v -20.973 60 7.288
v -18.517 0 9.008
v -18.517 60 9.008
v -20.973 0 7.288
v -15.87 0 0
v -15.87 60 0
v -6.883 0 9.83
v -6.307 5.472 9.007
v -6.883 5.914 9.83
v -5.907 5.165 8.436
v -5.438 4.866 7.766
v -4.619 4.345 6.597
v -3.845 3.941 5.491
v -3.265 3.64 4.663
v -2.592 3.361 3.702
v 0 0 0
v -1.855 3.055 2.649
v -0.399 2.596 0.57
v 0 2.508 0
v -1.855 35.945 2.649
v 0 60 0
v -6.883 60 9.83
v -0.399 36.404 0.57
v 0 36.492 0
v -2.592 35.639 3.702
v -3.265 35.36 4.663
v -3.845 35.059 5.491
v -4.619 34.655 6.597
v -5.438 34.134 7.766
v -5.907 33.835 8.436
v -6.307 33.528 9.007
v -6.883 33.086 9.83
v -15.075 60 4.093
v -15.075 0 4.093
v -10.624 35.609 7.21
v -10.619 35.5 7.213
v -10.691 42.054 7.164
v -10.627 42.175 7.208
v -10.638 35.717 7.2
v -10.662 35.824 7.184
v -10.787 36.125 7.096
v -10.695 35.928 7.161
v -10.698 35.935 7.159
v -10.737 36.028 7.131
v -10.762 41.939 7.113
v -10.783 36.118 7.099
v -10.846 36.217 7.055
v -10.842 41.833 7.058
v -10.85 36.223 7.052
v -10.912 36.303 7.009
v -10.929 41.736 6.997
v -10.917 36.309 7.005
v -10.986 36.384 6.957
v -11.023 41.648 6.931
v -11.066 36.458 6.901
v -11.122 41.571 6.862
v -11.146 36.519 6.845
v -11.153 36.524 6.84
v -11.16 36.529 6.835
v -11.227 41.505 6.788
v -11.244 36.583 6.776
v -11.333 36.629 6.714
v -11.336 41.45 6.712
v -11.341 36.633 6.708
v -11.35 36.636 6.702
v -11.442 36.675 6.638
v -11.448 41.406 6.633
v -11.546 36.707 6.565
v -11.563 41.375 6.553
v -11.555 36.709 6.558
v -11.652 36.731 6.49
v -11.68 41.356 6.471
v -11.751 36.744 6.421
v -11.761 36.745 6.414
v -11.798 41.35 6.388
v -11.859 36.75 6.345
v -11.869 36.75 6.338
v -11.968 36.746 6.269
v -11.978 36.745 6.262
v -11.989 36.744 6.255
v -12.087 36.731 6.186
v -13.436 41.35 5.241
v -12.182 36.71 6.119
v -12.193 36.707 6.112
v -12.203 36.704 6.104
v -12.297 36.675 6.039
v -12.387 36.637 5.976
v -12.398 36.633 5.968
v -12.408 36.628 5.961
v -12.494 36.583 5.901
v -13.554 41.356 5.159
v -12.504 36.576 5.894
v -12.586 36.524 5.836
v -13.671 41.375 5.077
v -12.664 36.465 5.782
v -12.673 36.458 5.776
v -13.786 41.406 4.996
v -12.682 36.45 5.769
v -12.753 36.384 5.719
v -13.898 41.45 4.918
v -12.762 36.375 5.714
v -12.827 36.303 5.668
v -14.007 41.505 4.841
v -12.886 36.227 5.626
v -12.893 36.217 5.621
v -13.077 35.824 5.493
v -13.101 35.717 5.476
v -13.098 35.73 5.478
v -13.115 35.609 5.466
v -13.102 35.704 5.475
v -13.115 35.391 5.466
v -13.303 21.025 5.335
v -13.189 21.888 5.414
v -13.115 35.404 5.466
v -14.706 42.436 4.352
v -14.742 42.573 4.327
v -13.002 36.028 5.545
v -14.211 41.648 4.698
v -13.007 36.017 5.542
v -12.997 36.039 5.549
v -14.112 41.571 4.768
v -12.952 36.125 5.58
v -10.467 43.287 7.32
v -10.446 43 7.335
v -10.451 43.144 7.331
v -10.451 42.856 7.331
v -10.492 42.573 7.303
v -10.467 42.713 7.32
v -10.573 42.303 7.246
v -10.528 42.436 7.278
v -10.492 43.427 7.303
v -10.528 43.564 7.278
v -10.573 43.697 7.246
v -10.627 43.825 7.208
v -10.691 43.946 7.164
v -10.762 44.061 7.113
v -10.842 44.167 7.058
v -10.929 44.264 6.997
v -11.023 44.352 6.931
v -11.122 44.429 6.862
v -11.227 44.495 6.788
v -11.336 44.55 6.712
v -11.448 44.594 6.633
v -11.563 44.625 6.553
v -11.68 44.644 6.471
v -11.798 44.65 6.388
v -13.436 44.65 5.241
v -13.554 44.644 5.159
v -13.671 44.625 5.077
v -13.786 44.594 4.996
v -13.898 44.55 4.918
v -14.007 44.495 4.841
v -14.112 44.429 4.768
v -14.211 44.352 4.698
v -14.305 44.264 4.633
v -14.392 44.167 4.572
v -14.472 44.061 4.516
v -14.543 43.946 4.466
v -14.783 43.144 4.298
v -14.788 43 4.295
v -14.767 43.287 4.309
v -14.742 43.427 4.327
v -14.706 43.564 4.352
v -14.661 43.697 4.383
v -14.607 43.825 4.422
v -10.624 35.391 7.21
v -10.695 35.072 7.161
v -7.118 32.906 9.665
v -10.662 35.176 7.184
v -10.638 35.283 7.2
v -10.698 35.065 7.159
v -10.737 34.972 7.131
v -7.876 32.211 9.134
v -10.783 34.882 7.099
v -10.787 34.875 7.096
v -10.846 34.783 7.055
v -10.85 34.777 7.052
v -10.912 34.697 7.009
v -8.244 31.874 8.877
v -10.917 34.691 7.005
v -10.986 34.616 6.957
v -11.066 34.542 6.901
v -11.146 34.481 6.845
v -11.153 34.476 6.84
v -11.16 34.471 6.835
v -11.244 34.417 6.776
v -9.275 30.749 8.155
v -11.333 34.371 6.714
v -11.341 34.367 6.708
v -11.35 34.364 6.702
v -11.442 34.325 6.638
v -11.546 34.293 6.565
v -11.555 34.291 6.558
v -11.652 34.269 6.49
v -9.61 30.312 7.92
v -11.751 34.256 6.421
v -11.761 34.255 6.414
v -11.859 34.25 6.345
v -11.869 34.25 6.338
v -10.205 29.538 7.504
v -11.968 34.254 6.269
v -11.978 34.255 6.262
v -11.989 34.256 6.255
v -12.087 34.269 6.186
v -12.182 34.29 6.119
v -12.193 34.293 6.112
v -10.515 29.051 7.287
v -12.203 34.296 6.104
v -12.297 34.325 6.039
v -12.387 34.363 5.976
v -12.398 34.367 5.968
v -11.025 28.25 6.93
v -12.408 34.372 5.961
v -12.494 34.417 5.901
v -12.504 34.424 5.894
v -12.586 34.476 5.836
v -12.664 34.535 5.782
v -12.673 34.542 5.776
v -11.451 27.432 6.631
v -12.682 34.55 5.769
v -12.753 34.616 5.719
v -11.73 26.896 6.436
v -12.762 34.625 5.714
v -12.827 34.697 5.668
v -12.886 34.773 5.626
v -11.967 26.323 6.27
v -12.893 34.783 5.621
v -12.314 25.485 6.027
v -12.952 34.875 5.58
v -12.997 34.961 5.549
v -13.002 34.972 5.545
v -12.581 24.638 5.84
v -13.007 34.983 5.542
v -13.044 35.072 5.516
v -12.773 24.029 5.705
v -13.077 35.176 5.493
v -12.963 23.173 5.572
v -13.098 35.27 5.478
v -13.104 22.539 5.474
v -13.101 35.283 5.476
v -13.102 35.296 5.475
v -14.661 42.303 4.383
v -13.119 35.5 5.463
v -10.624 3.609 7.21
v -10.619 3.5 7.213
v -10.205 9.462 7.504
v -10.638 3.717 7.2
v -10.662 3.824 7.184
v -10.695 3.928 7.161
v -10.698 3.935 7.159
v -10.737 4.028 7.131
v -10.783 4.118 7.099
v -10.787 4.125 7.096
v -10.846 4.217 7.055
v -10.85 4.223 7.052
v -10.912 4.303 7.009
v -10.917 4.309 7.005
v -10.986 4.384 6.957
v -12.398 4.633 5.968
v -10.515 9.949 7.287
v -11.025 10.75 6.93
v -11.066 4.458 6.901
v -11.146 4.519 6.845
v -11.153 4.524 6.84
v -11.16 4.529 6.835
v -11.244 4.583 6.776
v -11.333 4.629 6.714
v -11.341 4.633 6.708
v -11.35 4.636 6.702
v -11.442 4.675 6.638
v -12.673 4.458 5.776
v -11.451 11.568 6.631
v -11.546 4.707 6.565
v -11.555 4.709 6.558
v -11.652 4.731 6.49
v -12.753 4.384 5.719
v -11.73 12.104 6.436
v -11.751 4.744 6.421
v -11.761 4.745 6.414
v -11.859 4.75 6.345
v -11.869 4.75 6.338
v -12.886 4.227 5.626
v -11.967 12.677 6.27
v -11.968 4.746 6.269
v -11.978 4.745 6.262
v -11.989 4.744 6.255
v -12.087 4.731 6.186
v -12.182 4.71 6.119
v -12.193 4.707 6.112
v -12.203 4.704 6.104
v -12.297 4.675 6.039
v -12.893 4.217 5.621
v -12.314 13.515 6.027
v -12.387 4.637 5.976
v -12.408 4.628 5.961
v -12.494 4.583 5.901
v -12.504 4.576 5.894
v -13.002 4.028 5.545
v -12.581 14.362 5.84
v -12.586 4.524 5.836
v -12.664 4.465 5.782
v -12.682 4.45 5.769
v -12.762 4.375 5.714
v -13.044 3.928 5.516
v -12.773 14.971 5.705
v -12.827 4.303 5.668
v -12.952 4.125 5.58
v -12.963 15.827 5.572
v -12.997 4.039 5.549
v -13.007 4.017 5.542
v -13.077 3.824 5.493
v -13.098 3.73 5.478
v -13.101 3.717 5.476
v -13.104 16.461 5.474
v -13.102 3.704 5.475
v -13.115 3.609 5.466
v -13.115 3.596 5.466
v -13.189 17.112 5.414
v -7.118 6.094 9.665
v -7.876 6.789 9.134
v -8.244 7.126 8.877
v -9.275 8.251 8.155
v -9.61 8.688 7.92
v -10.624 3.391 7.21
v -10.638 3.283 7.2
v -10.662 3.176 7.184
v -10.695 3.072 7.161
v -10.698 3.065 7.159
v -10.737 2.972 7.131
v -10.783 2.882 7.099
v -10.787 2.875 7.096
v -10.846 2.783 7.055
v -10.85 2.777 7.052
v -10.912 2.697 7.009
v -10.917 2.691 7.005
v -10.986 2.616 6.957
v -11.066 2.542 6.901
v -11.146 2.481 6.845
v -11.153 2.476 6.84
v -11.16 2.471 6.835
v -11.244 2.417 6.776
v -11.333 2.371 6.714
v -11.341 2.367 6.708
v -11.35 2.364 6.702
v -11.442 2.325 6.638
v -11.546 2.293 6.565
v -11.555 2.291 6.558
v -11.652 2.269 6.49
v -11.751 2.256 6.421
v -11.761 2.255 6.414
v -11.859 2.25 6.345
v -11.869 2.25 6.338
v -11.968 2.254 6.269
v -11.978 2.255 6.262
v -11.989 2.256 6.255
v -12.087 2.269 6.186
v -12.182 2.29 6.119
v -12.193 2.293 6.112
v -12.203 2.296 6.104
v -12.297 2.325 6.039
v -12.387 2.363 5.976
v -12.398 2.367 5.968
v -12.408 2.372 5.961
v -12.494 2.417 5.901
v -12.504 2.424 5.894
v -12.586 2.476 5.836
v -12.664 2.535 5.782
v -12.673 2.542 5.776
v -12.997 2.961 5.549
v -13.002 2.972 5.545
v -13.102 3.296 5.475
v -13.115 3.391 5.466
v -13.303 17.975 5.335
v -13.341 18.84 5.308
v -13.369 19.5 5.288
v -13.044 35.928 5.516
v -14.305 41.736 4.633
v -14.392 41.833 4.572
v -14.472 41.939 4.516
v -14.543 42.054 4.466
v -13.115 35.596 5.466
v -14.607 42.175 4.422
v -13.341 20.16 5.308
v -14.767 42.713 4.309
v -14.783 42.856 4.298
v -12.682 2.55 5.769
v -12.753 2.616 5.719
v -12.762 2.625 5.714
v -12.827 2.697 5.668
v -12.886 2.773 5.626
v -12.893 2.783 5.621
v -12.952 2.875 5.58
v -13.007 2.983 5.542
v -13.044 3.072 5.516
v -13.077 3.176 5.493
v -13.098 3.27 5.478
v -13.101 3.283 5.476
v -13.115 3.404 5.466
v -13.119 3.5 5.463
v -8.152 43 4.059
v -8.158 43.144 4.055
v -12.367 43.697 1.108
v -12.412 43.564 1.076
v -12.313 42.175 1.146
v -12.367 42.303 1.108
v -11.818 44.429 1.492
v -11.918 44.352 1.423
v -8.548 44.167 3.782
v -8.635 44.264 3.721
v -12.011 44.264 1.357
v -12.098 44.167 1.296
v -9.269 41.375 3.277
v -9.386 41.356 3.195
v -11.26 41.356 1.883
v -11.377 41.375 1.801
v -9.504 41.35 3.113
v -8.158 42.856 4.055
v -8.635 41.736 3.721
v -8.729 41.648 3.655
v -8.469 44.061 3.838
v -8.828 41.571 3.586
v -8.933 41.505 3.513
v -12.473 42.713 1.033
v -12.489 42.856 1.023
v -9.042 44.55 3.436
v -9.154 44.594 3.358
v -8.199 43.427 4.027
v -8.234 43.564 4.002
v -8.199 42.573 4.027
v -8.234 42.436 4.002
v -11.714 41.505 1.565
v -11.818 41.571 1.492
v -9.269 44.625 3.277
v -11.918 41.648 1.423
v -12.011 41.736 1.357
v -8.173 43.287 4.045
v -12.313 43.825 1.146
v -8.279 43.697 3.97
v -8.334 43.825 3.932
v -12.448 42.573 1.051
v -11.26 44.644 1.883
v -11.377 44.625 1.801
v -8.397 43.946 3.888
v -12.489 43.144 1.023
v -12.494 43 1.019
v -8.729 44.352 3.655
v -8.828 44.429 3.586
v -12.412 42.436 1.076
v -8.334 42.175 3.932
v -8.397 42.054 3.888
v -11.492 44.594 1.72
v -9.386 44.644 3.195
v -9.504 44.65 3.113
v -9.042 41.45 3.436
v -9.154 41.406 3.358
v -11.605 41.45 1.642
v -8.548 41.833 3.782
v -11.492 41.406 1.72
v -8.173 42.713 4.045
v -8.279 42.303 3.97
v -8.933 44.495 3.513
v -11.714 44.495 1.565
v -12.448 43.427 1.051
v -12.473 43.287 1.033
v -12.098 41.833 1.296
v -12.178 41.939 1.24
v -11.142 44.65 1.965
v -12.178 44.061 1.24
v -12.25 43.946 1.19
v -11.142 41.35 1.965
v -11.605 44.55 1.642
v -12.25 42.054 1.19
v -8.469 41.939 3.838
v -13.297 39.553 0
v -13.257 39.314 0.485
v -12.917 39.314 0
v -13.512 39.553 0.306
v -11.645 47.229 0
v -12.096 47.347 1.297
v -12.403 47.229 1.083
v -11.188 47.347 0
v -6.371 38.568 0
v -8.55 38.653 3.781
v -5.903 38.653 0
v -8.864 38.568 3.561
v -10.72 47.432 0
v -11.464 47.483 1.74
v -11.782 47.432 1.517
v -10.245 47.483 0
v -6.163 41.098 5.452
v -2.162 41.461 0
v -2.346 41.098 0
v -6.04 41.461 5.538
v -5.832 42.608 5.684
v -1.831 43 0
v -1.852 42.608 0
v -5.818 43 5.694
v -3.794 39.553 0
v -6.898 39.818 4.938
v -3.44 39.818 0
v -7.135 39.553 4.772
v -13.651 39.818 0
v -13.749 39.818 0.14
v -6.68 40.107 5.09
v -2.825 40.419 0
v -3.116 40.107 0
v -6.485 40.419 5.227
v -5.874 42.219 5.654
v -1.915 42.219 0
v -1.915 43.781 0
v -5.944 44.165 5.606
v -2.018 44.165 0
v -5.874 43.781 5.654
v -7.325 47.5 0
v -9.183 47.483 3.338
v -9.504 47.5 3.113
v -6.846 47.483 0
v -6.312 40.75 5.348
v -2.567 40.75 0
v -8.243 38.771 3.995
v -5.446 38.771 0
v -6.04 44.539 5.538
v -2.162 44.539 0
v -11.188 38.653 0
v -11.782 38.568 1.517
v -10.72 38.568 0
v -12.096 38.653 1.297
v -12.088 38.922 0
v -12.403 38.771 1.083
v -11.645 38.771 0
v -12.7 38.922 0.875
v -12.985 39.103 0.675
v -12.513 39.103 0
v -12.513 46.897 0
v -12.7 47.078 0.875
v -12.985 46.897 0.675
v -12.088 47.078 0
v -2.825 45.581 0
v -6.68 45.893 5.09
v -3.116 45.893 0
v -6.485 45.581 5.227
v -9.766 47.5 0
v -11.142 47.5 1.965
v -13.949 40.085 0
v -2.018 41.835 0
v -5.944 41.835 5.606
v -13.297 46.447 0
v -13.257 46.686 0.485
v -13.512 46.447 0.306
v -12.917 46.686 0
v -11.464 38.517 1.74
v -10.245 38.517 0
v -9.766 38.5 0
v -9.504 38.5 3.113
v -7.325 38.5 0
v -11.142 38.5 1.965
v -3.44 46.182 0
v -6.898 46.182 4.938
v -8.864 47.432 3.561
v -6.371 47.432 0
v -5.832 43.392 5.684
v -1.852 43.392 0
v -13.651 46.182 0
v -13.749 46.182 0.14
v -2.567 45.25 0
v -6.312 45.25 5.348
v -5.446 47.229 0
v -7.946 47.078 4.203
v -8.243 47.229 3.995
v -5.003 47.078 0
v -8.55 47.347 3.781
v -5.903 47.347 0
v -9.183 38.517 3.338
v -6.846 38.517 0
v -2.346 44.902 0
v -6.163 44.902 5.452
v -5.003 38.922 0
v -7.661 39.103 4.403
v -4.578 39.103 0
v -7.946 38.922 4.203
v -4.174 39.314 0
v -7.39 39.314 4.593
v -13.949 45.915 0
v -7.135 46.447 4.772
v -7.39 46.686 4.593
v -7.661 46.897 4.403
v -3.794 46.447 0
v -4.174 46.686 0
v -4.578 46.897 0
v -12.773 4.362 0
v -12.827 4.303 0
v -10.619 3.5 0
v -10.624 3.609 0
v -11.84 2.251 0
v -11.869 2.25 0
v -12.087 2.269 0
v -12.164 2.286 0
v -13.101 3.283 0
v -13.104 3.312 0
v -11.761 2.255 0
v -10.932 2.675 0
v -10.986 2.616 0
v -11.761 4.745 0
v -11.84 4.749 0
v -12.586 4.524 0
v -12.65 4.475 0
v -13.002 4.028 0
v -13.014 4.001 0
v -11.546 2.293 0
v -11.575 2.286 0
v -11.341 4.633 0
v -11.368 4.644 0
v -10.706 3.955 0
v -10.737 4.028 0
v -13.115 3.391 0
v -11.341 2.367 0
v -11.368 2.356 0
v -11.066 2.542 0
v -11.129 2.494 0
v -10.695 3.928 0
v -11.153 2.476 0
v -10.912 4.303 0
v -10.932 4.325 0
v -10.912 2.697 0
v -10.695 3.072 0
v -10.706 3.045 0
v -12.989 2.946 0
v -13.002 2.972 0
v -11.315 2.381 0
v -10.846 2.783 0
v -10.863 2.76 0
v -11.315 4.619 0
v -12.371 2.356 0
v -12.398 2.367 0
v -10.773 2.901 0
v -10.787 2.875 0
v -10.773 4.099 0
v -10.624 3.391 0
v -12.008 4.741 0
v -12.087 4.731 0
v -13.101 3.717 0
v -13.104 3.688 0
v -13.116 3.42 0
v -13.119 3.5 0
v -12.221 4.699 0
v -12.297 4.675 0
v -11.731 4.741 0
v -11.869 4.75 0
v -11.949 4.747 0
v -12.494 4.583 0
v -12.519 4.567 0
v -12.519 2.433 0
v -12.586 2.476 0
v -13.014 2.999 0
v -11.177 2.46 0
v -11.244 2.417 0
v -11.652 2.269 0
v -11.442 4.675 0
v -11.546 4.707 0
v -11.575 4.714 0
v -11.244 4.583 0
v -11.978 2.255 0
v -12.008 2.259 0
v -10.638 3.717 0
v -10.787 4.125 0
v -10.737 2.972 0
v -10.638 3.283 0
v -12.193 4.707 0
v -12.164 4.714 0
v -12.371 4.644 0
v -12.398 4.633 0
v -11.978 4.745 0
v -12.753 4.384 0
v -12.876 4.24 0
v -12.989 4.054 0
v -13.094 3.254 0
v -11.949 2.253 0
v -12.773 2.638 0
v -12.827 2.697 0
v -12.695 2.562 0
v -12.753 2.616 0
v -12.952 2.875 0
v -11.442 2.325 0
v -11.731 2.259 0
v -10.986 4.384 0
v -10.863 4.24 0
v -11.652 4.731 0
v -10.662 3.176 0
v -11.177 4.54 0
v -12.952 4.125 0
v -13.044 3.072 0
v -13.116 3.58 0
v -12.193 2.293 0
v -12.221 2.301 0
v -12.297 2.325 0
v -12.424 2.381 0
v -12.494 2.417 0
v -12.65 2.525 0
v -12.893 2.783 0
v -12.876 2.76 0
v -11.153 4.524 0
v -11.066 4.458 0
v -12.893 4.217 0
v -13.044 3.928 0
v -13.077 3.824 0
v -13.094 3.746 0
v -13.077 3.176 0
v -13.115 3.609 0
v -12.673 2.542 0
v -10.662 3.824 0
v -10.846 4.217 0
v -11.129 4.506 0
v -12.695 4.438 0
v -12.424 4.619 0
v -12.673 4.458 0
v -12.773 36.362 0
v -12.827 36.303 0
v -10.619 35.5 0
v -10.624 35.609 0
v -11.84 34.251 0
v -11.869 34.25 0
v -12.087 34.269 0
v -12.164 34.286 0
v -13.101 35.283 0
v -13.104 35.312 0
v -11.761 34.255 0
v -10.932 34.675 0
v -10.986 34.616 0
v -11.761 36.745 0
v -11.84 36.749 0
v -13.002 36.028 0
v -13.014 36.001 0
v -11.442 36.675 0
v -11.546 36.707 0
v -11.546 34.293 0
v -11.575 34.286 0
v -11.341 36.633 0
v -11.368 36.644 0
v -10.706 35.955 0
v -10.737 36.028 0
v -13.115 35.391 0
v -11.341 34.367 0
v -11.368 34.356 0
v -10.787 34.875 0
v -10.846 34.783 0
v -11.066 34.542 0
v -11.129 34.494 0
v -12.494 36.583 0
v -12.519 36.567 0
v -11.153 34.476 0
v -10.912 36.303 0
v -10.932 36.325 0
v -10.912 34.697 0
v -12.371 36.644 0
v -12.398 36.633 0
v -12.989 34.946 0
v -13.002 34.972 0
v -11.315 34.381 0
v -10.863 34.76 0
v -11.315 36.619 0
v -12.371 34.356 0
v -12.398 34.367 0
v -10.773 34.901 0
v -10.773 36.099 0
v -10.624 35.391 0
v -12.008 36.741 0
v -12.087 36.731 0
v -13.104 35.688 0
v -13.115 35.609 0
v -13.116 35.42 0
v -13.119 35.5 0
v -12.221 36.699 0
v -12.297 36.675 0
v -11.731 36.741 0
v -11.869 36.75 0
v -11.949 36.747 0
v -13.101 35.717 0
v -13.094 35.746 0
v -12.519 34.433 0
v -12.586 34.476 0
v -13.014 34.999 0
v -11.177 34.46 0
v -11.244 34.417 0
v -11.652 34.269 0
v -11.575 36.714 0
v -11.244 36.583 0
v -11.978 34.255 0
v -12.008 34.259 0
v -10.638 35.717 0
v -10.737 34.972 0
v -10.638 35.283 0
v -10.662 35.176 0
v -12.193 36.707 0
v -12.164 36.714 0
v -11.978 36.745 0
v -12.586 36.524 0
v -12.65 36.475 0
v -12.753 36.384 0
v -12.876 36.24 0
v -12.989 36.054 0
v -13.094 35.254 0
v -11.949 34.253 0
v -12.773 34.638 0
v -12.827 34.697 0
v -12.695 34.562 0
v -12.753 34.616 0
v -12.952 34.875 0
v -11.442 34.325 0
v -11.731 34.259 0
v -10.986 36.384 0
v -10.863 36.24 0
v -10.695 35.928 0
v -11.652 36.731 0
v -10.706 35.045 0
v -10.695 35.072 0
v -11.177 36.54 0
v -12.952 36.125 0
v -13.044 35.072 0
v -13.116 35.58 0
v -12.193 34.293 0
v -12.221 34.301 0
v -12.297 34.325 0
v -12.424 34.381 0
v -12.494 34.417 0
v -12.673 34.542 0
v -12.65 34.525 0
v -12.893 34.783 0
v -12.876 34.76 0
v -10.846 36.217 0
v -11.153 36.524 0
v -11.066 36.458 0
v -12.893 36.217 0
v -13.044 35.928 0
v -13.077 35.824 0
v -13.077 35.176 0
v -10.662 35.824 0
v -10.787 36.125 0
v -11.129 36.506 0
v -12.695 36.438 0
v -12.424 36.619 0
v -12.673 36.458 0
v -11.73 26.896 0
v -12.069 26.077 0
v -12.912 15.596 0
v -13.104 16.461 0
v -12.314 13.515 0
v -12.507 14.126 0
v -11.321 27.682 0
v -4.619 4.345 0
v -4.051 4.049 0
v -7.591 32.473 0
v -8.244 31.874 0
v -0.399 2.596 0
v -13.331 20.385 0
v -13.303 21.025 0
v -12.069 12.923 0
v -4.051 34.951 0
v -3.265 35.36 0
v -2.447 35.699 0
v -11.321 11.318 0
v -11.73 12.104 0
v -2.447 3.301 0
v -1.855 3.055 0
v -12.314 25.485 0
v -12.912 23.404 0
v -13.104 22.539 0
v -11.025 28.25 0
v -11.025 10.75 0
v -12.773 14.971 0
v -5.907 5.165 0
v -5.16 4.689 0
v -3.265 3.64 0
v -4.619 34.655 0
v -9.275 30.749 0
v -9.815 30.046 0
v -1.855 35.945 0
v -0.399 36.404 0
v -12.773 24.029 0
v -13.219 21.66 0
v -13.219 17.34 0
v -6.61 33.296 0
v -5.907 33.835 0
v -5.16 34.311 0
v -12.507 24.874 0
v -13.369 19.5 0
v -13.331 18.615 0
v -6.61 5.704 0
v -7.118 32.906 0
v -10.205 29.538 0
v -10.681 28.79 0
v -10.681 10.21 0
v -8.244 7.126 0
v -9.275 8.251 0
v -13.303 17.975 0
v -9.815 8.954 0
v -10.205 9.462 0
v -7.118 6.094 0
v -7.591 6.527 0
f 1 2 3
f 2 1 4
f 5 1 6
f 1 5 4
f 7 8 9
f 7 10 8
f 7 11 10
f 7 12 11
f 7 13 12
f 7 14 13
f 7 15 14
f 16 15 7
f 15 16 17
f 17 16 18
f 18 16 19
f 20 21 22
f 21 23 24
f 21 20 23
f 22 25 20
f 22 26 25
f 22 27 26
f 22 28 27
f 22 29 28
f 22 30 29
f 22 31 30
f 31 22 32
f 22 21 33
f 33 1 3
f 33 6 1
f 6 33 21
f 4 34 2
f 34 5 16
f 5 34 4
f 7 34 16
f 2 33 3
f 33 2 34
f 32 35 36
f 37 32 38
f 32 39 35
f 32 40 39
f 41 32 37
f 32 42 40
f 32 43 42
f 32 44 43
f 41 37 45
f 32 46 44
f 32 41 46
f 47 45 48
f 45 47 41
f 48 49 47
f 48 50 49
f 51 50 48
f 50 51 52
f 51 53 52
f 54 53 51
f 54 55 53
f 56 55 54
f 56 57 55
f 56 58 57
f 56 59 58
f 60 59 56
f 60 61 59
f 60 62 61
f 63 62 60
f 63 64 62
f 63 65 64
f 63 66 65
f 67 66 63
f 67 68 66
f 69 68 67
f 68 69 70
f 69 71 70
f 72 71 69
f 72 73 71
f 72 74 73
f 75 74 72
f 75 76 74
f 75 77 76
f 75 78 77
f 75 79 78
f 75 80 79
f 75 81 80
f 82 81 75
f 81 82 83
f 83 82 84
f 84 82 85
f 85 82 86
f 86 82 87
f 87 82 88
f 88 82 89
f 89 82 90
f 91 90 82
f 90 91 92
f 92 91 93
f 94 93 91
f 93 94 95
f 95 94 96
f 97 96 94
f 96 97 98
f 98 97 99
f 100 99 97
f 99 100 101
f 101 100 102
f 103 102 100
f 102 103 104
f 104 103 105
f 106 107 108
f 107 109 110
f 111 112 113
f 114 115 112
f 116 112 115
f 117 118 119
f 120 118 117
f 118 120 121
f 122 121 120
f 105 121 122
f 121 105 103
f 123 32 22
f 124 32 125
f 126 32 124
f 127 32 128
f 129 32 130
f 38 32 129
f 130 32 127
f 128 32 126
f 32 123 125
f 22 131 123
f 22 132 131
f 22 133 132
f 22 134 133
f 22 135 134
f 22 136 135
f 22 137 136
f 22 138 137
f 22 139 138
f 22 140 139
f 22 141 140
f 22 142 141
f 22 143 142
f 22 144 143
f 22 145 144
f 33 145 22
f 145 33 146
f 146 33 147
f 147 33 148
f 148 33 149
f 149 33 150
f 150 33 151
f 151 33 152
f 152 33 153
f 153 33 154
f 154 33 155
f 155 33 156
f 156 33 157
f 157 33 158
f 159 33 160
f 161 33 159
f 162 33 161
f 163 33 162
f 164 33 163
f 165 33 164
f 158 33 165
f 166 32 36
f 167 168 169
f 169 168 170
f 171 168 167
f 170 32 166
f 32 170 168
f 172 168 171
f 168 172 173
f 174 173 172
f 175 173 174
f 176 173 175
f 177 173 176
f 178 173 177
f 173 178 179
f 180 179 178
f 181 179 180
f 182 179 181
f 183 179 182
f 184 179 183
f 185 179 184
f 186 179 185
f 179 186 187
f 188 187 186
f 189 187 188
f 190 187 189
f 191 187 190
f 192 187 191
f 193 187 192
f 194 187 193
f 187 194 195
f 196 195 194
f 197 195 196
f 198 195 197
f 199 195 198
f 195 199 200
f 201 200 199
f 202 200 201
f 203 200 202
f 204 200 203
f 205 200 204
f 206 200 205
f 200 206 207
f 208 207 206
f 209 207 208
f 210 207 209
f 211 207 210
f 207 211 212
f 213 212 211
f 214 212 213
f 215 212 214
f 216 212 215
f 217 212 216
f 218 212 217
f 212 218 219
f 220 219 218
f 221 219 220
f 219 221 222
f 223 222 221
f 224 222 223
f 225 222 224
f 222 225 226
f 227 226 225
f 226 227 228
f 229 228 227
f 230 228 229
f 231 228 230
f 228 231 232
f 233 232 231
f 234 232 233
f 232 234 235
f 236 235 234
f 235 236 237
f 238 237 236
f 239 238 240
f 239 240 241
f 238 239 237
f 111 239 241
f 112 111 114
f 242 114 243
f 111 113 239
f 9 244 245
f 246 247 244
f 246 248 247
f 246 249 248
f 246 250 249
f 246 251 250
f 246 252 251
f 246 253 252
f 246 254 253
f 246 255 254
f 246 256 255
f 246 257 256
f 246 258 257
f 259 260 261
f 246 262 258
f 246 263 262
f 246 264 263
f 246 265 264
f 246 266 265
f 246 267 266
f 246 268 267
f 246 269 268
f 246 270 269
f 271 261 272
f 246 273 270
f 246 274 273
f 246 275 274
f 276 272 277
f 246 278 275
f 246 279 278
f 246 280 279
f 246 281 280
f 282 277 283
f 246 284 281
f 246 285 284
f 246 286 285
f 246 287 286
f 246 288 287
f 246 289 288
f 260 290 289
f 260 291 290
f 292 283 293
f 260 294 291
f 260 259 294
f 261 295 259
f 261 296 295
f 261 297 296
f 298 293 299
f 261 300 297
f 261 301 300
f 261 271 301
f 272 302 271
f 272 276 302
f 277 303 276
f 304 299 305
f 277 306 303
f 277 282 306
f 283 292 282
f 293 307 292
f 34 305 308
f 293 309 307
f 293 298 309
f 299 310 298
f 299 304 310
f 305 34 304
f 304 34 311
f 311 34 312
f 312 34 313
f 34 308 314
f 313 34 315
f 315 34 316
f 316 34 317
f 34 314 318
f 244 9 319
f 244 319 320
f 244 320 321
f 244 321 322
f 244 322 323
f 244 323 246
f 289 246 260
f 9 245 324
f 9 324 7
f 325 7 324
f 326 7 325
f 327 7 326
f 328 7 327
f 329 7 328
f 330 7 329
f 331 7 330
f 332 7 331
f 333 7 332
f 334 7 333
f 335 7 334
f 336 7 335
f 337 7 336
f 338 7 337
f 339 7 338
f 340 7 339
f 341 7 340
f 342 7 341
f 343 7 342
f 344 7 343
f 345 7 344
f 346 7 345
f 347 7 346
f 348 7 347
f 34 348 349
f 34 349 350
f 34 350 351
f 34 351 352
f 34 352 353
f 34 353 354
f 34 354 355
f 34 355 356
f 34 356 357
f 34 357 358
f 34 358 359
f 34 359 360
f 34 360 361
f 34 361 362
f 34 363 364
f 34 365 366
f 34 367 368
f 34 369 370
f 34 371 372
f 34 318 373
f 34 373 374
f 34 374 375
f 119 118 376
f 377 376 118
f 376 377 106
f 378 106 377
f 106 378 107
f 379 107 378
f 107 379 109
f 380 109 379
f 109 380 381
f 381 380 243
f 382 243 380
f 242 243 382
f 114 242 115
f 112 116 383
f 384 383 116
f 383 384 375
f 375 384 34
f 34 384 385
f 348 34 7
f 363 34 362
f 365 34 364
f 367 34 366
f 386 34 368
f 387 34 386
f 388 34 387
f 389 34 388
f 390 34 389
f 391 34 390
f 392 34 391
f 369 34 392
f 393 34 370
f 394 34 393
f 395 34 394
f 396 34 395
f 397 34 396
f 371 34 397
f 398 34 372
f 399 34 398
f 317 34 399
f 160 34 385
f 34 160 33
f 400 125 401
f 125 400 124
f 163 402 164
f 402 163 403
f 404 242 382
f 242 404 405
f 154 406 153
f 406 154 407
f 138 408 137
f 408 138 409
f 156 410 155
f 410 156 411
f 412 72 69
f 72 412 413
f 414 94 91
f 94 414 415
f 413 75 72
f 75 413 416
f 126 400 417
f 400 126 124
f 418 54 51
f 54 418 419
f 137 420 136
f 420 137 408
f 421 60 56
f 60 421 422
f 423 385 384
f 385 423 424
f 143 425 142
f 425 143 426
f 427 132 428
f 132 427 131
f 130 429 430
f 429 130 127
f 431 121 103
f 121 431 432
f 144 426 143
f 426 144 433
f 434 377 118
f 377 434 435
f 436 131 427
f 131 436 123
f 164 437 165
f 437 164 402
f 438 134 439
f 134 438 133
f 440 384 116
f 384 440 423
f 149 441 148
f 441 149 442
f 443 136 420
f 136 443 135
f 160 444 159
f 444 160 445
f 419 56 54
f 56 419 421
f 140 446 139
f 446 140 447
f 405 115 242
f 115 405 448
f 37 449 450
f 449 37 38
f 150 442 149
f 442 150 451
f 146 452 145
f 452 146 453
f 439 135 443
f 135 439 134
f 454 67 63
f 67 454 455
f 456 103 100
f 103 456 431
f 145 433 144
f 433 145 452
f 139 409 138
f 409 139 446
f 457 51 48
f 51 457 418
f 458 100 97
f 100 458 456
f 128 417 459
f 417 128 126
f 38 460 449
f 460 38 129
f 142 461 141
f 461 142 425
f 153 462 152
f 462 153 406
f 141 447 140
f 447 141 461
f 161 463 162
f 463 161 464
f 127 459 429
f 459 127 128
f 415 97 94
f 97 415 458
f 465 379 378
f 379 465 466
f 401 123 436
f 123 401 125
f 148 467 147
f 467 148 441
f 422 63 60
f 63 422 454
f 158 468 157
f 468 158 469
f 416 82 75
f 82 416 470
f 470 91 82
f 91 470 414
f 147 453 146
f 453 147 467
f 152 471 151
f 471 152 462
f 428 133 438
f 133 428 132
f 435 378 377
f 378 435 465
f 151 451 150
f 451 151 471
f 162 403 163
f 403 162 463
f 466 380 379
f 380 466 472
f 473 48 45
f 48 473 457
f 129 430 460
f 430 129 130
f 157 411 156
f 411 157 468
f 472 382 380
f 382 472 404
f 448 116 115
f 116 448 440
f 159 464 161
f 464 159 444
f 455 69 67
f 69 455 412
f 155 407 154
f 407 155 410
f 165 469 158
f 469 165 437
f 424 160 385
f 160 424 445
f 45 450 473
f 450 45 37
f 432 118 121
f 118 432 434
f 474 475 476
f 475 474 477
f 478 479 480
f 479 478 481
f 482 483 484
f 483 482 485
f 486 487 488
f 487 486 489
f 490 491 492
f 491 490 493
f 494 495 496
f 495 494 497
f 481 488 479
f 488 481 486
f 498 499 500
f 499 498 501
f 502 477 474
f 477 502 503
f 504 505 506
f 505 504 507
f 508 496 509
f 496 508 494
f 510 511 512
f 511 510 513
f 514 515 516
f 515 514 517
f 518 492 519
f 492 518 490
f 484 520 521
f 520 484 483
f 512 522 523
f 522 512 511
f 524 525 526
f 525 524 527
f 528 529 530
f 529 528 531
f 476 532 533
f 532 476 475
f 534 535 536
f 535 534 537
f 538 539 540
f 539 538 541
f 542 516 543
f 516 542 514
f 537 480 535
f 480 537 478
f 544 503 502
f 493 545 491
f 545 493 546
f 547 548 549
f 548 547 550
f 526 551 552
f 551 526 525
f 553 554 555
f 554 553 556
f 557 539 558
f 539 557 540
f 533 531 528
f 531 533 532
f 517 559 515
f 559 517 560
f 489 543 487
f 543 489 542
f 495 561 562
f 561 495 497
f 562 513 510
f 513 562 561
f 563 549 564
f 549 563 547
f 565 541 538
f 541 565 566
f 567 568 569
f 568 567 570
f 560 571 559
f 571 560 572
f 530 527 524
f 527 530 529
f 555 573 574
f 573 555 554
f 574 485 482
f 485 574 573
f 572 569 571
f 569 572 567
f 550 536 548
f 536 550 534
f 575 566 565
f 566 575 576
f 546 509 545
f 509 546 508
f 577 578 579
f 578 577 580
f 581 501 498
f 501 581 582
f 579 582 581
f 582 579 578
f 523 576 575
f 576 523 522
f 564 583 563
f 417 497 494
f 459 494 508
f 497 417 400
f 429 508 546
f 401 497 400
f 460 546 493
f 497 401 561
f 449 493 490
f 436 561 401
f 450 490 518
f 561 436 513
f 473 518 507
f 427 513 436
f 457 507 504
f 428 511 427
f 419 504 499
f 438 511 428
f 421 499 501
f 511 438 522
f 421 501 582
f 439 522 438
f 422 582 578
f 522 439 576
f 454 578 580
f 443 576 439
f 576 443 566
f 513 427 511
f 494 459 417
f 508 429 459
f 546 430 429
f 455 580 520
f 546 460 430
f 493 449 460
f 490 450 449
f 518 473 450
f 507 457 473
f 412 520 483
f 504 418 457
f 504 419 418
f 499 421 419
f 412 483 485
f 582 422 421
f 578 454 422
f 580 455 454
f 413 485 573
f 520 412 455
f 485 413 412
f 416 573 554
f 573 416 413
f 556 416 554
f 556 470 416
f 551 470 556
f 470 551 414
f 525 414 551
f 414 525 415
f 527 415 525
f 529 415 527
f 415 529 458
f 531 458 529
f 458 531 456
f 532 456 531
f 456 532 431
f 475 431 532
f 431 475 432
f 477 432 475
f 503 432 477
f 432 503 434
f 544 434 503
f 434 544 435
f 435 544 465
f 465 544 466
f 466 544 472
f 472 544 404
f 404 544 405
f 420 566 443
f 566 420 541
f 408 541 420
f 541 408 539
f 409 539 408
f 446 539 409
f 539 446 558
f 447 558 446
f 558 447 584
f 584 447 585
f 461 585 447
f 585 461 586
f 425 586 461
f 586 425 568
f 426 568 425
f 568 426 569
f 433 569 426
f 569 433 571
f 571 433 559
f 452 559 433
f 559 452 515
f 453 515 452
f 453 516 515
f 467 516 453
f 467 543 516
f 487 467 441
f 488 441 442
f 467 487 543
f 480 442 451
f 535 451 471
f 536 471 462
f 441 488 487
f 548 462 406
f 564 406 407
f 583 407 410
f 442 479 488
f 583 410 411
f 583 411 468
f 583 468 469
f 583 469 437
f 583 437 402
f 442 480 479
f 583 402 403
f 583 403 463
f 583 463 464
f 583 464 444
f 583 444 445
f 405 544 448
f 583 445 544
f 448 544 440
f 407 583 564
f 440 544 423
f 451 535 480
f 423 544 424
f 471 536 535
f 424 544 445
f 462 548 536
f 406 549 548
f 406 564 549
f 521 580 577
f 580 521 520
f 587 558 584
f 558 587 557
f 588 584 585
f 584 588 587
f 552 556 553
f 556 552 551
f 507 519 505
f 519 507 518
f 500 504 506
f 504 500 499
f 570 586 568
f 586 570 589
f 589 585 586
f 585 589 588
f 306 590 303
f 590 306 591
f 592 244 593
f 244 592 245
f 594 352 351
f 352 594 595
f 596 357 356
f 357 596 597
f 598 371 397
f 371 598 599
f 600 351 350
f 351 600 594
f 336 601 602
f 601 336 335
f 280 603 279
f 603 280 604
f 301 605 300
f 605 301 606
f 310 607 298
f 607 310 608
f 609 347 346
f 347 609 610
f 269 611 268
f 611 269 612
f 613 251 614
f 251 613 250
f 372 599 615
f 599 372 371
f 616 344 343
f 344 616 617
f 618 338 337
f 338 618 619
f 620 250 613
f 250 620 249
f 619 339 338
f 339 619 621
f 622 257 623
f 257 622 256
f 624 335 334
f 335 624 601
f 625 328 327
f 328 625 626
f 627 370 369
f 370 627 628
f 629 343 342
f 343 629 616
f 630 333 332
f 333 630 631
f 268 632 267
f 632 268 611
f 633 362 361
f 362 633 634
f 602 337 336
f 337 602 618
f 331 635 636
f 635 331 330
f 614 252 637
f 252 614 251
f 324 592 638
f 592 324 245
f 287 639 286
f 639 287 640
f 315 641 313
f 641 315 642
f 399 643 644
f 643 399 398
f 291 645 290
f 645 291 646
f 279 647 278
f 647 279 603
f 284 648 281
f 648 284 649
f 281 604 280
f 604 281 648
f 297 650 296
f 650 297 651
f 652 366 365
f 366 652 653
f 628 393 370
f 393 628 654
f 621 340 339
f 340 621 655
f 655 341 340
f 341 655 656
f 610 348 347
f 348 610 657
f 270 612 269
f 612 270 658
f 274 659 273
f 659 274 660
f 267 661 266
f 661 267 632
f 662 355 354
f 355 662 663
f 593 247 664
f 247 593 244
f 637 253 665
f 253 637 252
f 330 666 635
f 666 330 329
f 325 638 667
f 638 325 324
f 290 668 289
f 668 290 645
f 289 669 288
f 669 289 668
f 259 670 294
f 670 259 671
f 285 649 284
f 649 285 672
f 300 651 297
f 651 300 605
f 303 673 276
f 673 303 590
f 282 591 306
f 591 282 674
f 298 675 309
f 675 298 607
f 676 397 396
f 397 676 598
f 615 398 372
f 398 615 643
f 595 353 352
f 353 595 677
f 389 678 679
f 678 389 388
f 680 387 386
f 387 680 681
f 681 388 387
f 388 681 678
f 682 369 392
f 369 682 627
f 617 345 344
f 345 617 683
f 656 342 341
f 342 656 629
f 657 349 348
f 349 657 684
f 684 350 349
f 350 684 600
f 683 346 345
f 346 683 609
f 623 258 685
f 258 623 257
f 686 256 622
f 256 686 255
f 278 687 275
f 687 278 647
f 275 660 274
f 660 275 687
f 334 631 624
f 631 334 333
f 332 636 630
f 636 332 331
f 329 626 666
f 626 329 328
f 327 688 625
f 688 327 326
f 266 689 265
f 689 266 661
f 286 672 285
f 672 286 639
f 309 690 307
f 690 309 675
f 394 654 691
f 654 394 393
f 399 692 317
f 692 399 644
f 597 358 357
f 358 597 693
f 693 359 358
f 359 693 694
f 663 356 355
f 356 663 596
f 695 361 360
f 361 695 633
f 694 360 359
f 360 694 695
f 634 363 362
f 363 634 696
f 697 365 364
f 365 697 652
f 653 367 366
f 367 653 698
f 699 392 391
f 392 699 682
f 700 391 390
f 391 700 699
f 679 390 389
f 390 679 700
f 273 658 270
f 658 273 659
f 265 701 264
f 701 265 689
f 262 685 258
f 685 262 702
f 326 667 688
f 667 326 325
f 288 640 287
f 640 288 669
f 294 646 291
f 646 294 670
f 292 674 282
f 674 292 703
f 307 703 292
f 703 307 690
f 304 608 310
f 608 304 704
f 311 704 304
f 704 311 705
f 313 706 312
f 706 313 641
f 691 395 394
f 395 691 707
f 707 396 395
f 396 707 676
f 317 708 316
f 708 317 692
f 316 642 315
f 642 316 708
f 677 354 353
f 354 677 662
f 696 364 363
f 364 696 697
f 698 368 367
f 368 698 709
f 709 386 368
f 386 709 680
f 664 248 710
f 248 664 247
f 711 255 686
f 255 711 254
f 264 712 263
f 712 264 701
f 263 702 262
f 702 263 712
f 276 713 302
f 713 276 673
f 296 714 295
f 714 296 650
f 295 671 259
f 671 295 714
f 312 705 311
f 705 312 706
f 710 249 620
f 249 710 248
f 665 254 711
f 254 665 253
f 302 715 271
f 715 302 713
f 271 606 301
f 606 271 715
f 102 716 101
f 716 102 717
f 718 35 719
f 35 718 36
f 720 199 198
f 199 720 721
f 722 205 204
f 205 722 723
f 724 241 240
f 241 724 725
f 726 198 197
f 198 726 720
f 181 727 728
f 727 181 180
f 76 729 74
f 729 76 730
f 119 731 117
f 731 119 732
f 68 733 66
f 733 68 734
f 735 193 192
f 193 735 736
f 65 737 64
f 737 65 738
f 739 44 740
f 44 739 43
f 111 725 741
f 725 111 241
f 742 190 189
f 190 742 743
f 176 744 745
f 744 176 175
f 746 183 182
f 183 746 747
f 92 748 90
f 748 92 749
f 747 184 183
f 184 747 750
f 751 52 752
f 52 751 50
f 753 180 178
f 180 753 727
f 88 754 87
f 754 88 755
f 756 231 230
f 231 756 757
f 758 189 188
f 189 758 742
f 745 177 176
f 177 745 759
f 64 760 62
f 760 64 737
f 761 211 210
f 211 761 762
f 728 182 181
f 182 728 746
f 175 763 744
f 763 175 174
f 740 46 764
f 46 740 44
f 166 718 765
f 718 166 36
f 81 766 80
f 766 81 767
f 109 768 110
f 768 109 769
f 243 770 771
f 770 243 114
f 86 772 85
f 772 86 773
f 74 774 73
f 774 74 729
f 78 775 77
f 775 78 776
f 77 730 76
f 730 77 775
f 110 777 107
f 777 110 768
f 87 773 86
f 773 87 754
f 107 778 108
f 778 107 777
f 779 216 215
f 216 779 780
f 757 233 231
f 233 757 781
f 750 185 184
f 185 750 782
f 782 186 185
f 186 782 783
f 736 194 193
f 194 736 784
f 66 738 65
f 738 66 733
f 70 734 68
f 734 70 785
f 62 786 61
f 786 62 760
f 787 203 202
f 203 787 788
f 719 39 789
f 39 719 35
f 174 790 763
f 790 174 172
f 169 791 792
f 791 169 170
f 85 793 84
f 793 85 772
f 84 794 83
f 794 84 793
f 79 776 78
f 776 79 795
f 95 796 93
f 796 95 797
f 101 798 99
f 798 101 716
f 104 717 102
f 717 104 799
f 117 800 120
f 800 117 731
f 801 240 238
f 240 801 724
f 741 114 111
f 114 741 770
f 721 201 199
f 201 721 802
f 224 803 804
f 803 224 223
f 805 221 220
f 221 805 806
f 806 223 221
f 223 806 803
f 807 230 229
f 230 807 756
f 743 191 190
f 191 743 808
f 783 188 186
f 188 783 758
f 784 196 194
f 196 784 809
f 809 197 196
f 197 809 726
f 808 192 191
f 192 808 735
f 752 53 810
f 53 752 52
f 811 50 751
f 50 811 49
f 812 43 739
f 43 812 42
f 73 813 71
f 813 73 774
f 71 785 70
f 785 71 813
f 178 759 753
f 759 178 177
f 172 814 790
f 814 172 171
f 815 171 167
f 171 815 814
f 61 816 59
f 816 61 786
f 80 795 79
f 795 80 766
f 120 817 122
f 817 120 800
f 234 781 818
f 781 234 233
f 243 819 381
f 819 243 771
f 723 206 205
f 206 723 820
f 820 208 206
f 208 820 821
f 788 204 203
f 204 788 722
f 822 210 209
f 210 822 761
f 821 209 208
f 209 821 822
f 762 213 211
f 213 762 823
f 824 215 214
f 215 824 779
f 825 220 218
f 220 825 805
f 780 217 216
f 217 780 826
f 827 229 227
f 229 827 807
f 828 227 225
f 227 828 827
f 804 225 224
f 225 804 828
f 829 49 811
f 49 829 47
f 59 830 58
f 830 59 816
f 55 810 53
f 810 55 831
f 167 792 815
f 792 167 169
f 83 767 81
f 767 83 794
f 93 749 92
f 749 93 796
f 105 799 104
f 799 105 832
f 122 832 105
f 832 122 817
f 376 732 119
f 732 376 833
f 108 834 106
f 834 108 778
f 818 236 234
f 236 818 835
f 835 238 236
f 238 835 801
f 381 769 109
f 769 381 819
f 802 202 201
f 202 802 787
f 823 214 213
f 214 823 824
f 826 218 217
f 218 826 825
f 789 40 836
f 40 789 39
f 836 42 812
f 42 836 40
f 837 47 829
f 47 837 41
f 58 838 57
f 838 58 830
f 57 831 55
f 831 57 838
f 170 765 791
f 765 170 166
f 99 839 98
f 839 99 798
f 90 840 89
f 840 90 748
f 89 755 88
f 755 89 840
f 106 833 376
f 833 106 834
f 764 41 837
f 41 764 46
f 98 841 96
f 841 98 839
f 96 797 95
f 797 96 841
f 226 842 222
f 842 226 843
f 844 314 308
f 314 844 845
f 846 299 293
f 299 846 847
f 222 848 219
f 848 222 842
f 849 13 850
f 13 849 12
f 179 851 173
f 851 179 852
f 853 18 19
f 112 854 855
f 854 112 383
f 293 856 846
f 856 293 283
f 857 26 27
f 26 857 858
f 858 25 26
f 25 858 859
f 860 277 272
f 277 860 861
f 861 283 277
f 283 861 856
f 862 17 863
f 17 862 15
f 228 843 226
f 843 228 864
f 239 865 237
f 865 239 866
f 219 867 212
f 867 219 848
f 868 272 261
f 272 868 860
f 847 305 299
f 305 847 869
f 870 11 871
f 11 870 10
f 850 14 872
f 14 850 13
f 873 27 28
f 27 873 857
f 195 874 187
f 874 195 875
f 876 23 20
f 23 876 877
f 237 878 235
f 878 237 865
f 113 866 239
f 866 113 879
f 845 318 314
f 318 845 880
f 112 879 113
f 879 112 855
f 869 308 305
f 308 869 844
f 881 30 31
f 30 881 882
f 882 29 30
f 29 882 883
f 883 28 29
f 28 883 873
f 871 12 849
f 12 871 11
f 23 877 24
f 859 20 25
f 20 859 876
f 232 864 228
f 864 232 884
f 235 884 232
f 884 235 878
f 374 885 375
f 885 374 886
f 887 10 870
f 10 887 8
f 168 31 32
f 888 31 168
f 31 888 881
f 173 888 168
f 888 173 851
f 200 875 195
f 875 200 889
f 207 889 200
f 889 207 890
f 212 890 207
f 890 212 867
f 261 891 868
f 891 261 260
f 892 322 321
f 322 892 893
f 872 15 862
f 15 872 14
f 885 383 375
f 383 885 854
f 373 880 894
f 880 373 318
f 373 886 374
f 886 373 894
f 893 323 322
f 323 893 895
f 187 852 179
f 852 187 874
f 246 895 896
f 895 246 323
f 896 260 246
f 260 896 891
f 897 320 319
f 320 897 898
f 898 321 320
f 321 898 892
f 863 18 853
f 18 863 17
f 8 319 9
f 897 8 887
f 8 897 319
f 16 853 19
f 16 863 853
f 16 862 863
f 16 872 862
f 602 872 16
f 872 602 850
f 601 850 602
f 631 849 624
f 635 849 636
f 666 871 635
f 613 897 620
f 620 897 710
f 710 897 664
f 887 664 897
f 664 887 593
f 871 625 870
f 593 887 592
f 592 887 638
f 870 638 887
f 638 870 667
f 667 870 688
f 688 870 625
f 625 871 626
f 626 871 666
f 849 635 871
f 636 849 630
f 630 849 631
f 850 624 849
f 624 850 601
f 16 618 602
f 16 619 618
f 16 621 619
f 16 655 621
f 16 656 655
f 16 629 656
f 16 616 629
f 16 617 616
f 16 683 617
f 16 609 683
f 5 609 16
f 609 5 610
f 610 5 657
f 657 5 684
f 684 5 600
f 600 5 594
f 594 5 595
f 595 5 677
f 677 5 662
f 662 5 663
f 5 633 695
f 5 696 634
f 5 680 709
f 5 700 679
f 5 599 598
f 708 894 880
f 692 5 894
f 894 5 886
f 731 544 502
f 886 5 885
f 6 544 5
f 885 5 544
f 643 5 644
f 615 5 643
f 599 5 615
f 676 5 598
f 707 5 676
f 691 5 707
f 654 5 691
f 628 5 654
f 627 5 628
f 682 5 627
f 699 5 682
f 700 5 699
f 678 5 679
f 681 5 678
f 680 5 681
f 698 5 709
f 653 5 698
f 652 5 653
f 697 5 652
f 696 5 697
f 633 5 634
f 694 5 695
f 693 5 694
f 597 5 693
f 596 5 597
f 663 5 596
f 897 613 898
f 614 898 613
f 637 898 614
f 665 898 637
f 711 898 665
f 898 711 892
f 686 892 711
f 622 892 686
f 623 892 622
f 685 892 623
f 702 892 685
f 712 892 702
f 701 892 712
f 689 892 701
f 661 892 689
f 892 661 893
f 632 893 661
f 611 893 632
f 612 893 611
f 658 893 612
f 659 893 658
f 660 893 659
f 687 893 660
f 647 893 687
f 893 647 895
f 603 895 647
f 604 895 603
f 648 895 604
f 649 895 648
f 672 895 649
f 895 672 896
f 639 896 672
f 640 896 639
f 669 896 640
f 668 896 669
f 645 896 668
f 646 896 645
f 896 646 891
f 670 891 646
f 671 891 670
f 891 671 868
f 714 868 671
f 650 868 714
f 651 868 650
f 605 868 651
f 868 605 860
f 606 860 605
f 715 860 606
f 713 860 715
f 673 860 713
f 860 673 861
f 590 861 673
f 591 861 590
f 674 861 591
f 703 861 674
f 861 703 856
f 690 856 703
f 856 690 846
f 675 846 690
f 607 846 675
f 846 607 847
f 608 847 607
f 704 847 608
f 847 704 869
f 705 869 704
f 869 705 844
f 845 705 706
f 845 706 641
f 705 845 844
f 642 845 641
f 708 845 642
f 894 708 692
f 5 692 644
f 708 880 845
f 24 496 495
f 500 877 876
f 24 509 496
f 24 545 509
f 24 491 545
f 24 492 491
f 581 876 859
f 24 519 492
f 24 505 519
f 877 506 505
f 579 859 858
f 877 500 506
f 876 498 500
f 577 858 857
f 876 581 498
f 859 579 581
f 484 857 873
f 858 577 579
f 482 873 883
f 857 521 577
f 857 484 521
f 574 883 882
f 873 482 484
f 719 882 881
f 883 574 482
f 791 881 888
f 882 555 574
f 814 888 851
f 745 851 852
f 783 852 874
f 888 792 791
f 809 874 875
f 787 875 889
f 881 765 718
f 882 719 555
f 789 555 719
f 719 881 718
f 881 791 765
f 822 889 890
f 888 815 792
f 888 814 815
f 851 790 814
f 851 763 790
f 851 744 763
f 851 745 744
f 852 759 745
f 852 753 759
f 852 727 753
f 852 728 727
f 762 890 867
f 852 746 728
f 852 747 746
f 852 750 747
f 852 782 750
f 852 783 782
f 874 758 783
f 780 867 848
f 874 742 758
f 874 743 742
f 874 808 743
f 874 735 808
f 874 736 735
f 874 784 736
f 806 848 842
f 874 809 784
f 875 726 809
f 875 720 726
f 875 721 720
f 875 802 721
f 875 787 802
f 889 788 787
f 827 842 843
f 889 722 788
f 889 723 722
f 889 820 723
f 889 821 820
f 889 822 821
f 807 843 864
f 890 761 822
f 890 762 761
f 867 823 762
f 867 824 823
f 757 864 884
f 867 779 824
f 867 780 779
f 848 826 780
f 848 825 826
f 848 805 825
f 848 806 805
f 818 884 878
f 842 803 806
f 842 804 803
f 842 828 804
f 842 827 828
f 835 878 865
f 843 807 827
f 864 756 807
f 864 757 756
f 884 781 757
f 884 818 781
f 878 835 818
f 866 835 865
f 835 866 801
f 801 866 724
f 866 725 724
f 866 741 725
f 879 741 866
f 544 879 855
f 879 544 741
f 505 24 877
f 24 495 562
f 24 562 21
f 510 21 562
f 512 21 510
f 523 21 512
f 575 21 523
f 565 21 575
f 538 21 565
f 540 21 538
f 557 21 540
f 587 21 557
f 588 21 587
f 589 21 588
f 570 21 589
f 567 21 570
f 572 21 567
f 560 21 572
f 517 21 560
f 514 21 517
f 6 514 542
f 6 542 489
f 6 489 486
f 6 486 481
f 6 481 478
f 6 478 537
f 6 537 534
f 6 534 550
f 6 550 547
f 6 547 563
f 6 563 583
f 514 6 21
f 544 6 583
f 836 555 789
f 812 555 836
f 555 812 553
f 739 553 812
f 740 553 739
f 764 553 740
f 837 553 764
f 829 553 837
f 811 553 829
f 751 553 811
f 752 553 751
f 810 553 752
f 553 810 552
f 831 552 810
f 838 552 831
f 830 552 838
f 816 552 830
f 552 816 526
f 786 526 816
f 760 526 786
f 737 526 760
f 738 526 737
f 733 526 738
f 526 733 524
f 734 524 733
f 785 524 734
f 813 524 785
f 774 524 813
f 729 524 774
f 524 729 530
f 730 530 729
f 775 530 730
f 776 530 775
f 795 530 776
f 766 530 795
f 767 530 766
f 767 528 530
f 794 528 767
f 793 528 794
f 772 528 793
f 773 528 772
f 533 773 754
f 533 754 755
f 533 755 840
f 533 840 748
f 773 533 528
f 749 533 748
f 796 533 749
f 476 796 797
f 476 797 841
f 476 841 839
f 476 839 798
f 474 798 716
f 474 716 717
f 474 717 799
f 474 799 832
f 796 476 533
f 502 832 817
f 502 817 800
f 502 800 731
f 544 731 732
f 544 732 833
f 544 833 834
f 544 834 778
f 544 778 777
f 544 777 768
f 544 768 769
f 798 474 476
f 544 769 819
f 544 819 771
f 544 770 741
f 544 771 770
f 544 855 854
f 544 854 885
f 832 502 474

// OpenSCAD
// Workpiece cooling fan holder for Makerfarm Prusa i3v.
// 
// TODO: derive the side wall thickness from the fan angle.
// TODO: define the main body using profile polygon extrusion.

/* [Hidden] */

// Set to 0 for final STL compilation (slow). Set to 1 for quick
// debugging (lower quality)
debug = 0;

/* [Global] */

// Fan angle. 
base_slop_angle = 35;  // [15:45]

// Diameter of the base attachment screw hole (M3x20).
base_hole_diameter = 3.3;

// Threaded holes for the fan screws (M3x12).
fan_screw_hole_diameter = 2.5;

// Thickness of the side wall at the botton of the slope.
base_side_thickness = 12;

/* [Hidden] */

// Set the mode (must be set to 0 for real STL generation).
$fn = (debug != 0) ? 16 : 72;

// Define the main block, without the slot and the holes.
base_length = 60; 
base_top_thickness = 3; 
base_width = base_side_thickness + 6;
base_height = base_top_thickness + 10;


// Distnace from the top of the part to the center of the hole.
base_hole_vertical_offset = base_top_thickness + 3;
base_hole_horizontal_offset = 43;
// Make the hole a vertical slot to allow this amount of play in 
// each direction.
base_hole_vertical_play = 1;

// The thickness left for the thread after removing the screw head sink.
// 4mm allows to go from the stock M3x16 to M3x20.
base_sink_thickness = 4;
// Have sufficient clearance for the M3 head.
base_sink_diameter=9;

// Define the two fan screw holes. The holes are perpendicular
// to the surface of the slope.
fan_screw_hole_space = 32;
fan_screw_hole_slope_offset = 4;
fan_screw_hole_horizontal_offset = 3.5;

// Define the big cut for the air flow. This cut is 
// perpendicular to the slope surface.
fan_vent_diameter = 35;

// Small > 0 values that are used to maintain manifold.
eps=0.001;
eps2 = 2 * eps;

// The main block, with a cut to form a L shape profile.
module base_main() {
  difference() {
    cube([base_width, base_length, base_height]);
    translate([base_side_thickness, -eps, -base_top_thickness]) 
        cube([base_width+eps, base_length+eps2, base_height+eps]); 
  }
}

module horizontal_hole(y, z, depth, d) {
  translate([-eps, y, z]) rotate([0, 90, 0]) 
    cylinder(r=d/2, h=depth + eps2);
}

// The hole and sink for the base screw.
module base_hole() {
  y = base_hole_horizontal_offset;
  z = base_height - base_hole_vertical_offset;
  // Vertical slot for perfect fit.
  hull() {
    horizontal_hole(y, z+base_hole_vertical_play, base_width, base_hole_diameter);
    horizontal_hole(y, z-base_hole_vertical_play, base_width, base_hole_diameter);
  }
  hull() {
    horizontal_hole(y, z+base_hole_vertical_play, base_side_thickness - base_sink_thickness, base_sink_diameter);
    horizontal_hole(y, z-base_hole_vertical_play, base_side_thickness - base_sink_thickness, base_sink_diameter);
  }
}

// A general round hole that is perpendicular to the slop surface. Offset is from
// the top of the slop, d diameter.
module slope_hole(y, offset, d) {
  // Some math mumbo jumbo.
  t1 = offset * cos(base_slop_angle);
  t2 = base_height - t1;
  t3 = tan(base_slop_angle)*t2;
  t4 = t3 * tan(base_slop_angle);
  z = t2 + t4;
  translate([-eps, y, z]) rotate([0, 90+base_slop_angle, 0])  
      translate([0, 0, -base_width]) cylinder(r=d/2, h=2*base_width);
}

module fan_screw_holes() {
  slope_hole(fan_screw_hole_horizontal_offset, fan_screw_hole_slope_offset, fan_screw_hole_diameter);
  slope_hole(fan_screw_hole_horizontal_offset + fan_screw_hole_space, 
      fan_screw_hole_slope_offset, fan_screw_hole_diameter);
}

module fan_vent() {
   y = fan_screw_hole_horizontal_offset + fan_screw_hole_space/2;
   slope_hole(
      fan_screw_hole_horizontal_offset + fan_screw_hole_space/2, 
      fan_screw_hole_slope_offset + fan_screw_hole_space/2, 
      fan_vent_diameter);
}

// Defines a substruction from the main body that creates the slope.
module slop() {
  rotate([0, base_slop_angle, 0]) translate([-base_width, -eps, 0]) 
      cube([base_width, base_length+eps2, 2*base_height]);
}


// The entire part.
module main() {
  difference() {
    base_main();
    // Reovals.
    base_hole();
    fan_screw_holes();
    fan_vent();
    slop();
  }
}

if (debug != 0) {
  // Debug in normal orientation.
  main();
} else {
  // Orientation for printing. 
  rotate([0, -90 - base_slop_angle, 0]) main();
}
